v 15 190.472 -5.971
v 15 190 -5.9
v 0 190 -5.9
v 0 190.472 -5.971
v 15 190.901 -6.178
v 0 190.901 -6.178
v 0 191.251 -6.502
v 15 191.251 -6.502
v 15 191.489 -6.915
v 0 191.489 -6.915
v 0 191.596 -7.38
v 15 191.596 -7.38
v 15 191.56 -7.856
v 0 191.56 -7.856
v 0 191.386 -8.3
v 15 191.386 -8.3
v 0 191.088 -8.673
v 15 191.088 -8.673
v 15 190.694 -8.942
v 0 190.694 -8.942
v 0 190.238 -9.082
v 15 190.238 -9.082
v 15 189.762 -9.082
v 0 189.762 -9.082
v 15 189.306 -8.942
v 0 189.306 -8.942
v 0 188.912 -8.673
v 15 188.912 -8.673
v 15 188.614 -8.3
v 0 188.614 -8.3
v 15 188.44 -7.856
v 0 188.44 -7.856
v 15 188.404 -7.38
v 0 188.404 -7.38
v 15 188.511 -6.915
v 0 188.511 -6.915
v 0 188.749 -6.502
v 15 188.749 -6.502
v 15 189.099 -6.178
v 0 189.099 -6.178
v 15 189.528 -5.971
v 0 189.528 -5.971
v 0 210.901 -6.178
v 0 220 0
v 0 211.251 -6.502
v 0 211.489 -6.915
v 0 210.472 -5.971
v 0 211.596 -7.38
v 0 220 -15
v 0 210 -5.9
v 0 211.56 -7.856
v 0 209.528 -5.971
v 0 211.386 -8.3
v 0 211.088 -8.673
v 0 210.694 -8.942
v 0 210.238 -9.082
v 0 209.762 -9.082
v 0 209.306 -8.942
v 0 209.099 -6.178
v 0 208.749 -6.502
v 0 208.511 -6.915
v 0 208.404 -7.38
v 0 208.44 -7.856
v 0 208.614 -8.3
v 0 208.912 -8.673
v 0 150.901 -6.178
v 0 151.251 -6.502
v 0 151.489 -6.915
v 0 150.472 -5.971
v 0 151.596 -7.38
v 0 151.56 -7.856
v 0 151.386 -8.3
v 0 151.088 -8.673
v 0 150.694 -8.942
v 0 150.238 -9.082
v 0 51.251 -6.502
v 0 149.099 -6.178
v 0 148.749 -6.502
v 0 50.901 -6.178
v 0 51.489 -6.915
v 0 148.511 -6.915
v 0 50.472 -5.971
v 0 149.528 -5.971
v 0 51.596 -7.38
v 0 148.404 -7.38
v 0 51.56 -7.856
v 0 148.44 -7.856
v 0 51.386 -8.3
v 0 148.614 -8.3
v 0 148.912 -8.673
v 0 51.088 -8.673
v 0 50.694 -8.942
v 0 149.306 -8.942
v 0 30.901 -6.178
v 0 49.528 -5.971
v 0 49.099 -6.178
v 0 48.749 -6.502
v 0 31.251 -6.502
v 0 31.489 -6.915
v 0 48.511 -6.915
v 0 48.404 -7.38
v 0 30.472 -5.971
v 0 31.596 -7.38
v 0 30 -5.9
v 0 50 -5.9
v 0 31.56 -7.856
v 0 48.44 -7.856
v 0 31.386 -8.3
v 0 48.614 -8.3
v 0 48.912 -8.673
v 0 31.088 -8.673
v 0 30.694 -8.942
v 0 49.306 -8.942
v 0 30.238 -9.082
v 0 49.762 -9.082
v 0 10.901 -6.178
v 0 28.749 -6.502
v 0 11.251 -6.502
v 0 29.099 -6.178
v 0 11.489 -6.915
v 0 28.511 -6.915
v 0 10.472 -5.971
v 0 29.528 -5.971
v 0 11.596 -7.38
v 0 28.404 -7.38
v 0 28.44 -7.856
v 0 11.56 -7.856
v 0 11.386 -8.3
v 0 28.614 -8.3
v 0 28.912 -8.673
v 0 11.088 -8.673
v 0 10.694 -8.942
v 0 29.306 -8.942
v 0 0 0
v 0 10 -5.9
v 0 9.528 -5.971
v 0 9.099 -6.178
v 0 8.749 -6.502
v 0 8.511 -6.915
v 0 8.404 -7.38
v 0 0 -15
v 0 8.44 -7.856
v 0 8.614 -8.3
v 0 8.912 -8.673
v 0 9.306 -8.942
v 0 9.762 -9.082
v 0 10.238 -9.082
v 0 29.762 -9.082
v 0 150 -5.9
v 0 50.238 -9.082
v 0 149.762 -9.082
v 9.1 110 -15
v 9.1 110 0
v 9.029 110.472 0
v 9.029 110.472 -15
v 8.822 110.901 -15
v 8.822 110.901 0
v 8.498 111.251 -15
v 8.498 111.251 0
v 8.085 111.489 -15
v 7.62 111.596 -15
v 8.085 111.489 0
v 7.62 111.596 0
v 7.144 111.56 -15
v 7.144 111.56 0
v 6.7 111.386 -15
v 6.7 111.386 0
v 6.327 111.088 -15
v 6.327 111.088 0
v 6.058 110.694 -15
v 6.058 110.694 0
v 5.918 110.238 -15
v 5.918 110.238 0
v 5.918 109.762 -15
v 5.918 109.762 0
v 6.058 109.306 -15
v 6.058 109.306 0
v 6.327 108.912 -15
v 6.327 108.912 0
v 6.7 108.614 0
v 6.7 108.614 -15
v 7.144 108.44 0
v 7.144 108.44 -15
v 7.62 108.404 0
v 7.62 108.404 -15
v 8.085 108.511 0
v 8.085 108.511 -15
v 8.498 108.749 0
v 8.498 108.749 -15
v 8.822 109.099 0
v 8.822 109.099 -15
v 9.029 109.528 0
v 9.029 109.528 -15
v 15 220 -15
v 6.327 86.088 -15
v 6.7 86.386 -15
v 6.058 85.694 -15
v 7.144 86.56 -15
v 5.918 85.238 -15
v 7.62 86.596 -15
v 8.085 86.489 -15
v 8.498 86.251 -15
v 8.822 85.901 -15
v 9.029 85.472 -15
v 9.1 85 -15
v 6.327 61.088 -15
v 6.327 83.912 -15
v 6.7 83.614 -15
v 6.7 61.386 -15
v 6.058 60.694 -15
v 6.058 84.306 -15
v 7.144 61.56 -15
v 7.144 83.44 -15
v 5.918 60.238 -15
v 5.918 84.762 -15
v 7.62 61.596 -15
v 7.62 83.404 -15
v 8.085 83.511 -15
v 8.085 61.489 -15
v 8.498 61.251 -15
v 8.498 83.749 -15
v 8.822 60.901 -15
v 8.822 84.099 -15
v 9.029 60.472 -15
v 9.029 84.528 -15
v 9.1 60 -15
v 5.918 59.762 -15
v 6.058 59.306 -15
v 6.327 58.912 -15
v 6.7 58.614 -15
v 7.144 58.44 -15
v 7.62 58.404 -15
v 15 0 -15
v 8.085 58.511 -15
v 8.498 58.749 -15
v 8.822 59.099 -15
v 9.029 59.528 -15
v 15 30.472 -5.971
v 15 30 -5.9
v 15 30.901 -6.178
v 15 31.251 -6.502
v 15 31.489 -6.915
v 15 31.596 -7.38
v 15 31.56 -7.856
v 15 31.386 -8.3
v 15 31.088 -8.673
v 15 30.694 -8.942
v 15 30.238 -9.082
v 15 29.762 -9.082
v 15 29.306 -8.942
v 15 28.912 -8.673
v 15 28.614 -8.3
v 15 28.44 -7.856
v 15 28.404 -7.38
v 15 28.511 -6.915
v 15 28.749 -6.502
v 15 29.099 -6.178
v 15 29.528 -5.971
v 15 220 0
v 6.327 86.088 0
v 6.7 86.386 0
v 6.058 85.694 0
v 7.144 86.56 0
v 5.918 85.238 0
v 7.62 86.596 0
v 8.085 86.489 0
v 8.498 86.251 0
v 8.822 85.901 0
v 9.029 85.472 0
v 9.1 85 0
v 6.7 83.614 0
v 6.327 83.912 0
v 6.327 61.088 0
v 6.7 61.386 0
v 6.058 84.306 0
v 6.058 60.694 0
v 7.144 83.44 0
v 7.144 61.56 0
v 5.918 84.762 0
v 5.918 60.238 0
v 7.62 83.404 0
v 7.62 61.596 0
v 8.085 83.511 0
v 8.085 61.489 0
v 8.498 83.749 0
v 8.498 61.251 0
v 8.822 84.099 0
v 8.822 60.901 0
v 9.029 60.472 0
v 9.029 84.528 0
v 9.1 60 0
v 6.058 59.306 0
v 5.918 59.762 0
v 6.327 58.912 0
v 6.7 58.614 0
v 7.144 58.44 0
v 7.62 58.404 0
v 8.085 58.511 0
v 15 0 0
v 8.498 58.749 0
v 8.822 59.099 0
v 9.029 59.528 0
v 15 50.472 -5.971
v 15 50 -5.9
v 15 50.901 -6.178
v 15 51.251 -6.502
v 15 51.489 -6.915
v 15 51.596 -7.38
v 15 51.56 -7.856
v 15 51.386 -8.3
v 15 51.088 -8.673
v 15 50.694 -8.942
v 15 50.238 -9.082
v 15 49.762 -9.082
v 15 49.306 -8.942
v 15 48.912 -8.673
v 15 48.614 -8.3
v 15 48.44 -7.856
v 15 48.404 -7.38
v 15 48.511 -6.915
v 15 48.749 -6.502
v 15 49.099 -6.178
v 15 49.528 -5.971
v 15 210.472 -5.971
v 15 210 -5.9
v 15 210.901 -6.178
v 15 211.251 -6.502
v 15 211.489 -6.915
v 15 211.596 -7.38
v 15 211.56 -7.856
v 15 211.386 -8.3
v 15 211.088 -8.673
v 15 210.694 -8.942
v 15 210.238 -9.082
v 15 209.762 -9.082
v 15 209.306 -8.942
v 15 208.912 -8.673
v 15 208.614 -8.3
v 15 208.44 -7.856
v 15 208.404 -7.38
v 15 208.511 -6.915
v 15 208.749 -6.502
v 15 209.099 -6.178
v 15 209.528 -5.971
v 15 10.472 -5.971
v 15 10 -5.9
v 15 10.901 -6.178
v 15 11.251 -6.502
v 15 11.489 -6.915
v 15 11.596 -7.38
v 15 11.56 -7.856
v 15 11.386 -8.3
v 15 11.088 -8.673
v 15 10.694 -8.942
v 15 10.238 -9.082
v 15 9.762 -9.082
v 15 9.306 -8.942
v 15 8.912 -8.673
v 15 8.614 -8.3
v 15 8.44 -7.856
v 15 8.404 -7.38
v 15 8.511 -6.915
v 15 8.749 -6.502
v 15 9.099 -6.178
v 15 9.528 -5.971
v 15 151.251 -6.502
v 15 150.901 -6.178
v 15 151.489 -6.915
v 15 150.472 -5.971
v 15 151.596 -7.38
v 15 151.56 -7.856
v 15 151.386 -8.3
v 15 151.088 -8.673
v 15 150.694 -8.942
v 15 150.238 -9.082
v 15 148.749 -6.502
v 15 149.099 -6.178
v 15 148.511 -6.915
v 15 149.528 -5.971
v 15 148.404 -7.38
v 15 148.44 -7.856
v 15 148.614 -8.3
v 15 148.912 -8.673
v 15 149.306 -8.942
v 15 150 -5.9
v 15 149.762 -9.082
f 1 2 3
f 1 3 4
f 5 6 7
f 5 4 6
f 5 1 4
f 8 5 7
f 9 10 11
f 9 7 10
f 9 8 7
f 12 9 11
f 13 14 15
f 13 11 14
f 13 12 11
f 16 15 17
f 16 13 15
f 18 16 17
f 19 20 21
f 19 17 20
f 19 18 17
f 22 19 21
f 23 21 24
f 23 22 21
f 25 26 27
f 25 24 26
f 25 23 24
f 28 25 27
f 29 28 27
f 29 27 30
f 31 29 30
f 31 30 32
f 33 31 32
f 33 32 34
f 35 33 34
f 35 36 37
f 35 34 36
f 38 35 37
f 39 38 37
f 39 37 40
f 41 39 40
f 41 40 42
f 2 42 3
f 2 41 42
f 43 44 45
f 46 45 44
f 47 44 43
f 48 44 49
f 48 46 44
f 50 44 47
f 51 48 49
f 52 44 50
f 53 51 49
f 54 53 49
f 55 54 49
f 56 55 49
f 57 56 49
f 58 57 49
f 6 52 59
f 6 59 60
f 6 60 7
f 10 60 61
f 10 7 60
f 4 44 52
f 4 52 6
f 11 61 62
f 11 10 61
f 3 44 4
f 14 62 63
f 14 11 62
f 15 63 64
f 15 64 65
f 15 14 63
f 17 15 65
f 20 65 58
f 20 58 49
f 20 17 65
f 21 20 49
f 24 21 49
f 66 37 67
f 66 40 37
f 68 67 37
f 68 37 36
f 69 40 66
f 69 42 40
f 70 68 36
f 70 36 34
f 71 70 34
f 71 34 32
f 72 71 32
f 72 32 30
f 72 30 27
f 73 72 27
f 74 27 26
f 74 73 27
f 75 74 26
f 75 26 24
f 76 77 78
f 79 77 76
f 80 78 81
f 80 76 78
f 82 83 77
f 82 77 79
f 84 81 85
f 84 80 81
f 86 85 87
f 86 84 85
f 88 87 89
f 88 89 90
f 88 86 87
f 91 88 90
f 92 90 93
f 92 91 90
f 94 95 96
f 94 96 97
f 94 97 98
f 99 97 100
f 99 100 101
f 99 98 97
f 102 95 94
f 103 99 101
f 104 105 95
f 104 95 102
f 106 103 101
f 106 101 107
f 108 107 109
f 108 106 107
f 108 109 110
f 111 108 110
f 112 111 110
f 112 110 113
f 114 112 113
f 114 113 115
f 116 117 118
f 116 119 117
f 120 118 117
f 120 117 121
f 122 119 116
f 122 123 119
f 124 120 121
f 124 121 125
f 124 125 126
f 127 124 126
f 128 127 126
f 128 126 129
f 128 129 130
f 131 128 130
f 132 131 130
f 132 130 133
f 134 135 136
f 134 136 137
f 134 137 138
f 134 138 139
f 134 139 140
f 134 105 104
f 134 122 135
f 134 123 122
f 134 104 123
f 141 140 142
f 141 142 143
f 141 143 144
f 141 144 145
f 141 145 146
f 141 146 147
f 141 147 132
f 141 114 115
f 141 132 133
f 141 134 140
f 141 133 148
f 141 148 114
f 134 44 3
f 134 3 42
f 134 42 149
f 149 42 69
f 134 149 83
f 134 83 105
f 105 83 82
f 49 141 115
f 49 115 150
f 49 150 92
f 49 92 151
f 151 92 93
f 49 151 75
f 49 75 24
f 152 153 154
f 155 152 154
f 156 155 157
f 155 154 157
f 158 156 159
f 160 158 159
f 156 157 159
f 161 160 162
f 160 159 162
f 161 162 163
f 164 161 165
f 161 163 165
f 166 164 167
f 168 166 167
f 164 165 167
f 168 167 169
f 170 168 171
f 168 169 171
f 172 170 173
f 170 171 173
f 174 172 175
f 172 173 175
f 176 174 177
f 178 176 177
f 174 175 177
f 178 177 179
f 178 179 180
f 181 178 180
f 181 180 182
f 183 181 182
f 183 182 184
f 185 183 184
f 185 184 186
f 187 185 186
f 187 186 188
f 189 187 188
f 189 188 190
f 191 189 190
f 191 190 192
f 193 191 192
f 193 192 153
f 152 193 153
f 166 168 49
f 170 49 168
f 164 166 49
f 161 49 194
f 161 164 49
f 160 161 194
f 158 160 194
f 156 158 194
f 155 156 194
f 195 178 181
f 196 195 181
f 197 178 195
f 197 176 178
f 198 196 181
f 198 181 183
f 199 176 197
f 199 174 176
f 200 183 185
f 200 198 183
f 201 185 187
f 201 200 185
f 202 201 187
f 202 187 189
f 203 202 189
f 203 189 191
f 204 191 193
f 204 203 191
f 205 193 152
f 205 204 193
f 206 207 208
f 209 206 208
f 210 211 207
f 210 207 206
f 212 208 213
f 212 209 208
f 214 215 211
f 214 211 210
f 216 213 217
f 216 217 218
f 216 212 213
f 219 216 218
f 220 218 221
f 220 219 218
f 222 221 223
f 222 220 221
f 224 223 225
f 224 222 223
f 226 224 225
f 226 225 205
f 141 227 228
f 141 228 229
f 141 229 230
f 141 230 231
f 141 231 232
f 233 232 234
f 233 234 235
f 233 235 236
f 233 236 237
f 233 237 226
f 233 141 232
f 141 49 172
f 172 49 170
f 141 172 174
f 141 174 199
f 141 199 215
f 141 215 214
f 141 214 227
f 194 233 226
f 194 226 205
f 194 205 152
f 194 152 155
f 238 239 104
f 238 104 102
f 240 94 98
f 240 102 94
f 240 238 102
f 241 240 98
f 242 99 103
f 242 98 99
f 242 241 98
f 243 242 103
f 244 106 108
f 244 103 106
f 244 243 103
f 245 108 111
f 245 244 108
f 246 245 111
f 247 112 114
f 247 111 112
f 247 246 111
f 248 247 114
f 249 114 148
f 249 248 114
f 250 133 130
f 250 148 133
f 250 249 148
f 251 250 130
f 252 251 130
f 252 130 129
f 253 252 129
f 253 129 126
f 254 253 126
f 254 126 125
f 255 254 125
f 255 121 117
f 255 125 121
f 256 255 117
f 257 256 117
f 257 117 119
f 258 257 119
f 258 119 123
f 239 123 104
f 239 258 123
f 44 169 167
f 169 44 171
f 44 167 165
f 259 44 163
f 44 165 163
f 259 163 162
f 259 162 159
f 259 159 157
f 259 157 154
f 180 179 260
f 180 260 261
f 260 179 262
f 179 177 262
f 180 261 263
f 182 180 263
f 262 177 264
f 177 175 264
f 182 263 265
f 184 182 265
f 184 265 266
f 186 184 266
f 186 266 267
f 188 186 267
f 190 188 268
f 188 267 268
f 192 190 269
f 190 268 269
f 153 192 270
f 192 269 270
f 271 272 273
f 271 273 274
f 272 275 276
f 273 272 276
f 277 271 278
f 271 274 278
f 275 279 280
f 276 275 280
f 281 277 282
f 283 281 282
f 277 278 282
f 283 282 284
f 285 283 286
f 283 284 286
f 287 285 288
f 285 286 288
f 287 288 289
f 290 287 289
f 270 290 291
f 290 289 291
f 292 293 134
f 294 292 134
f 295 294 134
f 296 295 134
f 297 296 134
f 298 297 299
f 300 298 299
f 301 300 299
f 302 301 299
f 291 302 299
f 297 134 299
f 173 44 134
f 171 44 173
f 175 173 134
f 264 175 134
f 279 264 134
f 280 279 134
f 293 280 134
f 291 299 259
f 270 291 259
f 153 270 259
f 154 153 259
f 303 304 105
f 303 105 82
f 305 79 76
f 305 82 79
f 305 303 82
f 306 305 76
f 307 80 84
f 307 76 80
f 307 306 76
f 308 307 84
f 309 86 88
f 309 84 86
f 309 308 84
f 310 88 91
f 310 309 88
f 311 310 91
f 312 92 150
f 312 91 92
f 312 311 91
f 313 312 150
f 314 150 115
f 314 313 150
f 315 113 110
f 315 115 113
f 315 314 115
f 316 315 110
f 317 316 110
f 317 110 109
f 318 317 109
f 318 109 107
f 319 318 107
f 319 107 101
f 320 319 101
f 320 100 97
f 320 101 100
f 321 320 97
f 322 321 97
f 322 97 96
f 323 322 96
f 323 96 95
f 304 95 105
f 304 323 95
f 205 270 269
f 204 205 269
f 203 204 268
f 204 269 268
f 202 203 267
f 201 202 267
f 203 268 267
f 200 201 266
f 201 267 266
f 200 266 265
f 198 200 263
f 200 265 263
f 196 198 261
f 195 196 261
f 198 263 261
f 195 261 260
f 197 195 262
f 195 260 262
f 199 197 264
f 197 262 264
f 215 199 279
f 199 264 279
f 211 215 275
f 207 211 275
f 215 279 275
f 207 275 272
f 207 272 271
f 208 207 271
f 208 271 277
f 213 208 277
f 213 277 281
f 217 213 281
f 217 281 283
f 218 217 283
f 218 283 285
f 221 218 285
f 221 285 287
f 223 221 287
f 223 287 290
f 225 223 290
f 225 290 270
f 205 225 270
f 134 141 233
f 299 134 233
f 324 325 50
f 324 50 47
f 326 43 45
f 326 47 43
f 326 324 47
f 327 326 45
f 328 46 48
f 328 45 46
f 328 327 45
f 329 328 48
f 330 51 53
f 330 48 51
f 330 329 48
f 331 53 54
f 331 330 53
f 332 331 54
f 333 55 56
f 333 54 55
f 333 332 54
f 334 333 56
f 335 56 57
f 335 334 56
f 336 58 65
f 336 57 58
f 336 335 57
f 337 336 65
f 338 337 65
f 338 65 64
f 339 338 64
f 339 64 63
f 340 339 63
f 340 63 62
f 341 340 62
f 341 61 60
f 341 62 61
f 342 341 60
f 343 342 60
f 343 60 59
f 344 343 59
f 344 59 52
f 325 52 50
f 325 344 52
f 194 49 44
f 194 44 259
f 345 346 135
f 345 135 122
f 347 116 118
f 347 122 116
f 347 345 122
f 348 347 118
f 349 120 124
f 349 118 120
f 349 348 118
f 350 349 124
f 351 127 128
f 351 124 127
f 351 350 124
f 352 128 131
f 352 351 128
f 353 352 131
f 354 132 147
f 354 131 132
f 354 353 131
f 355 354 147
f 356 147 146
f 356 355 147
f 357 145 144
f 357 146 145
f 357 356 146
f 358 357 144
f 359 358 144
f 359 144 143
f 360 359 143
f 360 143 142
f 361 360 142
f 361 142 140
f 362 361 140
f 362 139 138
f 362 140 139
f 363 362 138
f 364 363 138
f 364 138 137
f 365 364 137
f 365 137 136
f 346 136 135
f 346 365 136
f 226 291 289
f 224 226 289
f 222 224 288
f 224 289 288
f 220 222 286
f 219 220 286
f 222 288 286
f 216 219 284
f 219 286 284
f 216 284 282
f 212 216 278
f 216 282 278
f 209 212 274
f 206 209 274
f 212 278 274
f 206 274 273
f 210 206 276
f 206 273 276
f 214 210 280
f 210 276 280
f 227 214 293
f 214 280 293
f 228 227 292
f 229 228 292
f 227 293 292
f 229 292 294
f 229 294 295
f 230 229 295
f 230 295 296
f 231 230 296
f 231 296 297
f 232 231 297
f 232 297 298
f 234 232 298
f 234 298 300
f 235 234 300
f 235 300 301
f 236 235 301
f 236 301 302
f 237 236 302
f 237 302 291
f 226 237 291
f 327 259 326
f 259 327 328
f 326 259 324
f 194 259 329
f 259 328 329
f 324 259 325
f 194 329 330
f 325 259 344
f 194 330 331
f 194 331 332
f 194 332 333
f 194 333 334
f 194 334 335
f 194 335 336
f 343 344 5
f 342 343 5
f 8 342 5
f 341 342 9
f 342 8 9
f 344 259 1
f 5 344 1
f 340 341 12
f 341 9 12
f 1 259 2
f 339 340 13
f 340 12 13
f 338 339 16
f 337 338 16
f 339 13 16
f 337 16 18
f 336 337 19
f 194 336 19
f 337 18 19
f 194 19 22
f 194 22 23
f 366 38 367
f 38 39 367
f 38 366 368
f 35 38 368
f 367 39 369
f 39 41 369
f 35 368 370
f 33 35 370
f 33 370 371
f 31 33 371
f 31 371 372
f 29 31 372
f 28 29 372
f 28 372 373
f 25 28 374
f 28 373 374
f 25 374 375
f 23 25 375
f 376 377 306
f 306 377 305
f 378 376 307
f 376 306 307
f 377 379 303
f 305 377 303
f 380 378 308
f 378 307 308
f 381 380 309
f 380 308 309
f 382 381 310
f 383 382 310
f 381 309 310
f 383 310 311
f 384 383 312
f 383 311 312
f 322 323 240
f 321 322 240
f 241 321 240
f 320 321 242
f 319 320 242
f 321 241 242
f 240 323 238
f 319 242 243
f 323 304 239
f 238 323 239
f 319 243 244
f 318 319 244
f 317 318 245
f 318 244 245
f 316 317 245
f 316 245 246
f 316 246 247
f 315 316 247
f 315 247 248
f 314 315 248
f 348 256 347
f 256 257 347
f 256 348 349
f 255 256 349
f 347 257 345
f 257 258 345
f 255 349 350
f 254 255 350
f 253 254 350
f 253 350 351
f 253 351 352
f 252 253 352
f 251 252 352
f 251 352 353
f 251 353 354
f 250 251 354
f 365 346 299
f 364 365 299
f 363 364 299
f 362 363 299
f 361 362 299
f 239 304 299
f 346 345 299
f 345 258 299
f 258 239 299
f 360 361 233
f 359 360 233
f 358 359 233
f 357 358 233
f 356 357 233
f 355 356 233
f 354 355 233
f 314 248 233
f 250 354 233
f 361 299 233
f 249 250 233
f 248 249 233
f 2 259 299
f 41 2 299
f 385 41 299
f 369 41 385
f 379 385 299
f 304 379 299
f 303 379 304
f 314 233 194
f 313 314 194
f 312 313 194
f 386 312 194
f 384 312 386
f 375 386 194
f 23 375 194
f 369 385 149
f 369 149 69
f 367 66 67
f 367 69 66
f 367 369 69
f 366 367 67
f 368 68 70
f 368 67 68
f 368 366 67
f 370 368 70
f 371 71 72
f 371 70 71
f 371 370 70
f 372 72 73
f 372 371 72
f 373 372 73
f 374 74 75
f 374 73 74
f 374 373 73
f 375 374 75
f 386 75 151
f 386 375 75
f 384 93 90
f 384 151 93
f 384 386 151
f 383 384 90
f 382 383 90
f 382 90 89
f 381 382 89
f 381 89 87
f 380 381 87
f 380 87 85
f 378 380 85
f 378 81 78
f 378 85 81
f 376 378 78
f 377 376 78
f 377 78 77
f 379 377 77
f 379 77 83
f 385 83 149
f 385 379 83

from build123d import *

# Parameters (mm, degrees)
SKETCH_1_W               = 15
SKETCH_1_H               = 15
EXTRUDE_1_DEPTH          = 220
SKETCH_2_R               = 1.6
CUT_EXTRUDE_1_DEPTH      = 222.020361053
CUT_EXTRUDE_2_DEPTH      = 222.020361053
CUT_EXTRUDE_2_DEPTH_BACK = 222.020361053
SKETCH_3_R               = 1.6


with BuildPart() as part:
    # 草图1 → 凸台-拉伸1 (new body)
    with BuildSketch(Plane(origin=(0, 0, 0), x_dir=(1, 0, 0), z_dir=(0, 1, 0))):
        with Locations((7.5, 7.5)):
            Rectangle(SKETCH_1_W, SKETCH_1_H)
    extrude(amount=EXTRUDE_1_DEPTH)

    # 草图2 → 切除-拉伸1 (cut, through all)
    with BuildSketch(Plane.XY):
        with Locations((7.5, 60)):
            Circle(SKETCH_2_R)
        with Locations((7.5, 85)):
            Circle(SKETCH_2_R)
        with Locations((7.5, 110)):
            Circle(SKETCH_2_R)
    extrude(amount=-CUT_EXTRUDE_1_DEPTH, mode=Mode.SUBTRACT)

    # 草图3 → 切除-拉伸2 (cut, two sides: drawn at the far end of the back side and taken through both)
    with BuildSketch(Plane.ZY.offset(-CUT_EXTRUDE_2_DEPTH_BACK)):
        with Locations((-7.5, 50)):
            Circle(SKETCH_3_R)
        with Locations((-7.5, 10)):
            Circle(SKETCH_3_R)
        with Locations((-7.5, 30)):
            Circle(SKETCH_3_R)
        with Locations((-7.5, 210)):
            Circle(SKETCH_3_R)
        with Locations((-7.5, 190)):
            Circle(SKETCH_3_R)
        with Locations((-7.5, 150)):
            Circle(SKETCH_3_R)
    extrude(amount=CUT_EXTRUDE_2_DEPTH + CUT_EXTRUDE_2_DEPTH_BACK, mode=Mode.SUBTRACT)


solid = part.part
